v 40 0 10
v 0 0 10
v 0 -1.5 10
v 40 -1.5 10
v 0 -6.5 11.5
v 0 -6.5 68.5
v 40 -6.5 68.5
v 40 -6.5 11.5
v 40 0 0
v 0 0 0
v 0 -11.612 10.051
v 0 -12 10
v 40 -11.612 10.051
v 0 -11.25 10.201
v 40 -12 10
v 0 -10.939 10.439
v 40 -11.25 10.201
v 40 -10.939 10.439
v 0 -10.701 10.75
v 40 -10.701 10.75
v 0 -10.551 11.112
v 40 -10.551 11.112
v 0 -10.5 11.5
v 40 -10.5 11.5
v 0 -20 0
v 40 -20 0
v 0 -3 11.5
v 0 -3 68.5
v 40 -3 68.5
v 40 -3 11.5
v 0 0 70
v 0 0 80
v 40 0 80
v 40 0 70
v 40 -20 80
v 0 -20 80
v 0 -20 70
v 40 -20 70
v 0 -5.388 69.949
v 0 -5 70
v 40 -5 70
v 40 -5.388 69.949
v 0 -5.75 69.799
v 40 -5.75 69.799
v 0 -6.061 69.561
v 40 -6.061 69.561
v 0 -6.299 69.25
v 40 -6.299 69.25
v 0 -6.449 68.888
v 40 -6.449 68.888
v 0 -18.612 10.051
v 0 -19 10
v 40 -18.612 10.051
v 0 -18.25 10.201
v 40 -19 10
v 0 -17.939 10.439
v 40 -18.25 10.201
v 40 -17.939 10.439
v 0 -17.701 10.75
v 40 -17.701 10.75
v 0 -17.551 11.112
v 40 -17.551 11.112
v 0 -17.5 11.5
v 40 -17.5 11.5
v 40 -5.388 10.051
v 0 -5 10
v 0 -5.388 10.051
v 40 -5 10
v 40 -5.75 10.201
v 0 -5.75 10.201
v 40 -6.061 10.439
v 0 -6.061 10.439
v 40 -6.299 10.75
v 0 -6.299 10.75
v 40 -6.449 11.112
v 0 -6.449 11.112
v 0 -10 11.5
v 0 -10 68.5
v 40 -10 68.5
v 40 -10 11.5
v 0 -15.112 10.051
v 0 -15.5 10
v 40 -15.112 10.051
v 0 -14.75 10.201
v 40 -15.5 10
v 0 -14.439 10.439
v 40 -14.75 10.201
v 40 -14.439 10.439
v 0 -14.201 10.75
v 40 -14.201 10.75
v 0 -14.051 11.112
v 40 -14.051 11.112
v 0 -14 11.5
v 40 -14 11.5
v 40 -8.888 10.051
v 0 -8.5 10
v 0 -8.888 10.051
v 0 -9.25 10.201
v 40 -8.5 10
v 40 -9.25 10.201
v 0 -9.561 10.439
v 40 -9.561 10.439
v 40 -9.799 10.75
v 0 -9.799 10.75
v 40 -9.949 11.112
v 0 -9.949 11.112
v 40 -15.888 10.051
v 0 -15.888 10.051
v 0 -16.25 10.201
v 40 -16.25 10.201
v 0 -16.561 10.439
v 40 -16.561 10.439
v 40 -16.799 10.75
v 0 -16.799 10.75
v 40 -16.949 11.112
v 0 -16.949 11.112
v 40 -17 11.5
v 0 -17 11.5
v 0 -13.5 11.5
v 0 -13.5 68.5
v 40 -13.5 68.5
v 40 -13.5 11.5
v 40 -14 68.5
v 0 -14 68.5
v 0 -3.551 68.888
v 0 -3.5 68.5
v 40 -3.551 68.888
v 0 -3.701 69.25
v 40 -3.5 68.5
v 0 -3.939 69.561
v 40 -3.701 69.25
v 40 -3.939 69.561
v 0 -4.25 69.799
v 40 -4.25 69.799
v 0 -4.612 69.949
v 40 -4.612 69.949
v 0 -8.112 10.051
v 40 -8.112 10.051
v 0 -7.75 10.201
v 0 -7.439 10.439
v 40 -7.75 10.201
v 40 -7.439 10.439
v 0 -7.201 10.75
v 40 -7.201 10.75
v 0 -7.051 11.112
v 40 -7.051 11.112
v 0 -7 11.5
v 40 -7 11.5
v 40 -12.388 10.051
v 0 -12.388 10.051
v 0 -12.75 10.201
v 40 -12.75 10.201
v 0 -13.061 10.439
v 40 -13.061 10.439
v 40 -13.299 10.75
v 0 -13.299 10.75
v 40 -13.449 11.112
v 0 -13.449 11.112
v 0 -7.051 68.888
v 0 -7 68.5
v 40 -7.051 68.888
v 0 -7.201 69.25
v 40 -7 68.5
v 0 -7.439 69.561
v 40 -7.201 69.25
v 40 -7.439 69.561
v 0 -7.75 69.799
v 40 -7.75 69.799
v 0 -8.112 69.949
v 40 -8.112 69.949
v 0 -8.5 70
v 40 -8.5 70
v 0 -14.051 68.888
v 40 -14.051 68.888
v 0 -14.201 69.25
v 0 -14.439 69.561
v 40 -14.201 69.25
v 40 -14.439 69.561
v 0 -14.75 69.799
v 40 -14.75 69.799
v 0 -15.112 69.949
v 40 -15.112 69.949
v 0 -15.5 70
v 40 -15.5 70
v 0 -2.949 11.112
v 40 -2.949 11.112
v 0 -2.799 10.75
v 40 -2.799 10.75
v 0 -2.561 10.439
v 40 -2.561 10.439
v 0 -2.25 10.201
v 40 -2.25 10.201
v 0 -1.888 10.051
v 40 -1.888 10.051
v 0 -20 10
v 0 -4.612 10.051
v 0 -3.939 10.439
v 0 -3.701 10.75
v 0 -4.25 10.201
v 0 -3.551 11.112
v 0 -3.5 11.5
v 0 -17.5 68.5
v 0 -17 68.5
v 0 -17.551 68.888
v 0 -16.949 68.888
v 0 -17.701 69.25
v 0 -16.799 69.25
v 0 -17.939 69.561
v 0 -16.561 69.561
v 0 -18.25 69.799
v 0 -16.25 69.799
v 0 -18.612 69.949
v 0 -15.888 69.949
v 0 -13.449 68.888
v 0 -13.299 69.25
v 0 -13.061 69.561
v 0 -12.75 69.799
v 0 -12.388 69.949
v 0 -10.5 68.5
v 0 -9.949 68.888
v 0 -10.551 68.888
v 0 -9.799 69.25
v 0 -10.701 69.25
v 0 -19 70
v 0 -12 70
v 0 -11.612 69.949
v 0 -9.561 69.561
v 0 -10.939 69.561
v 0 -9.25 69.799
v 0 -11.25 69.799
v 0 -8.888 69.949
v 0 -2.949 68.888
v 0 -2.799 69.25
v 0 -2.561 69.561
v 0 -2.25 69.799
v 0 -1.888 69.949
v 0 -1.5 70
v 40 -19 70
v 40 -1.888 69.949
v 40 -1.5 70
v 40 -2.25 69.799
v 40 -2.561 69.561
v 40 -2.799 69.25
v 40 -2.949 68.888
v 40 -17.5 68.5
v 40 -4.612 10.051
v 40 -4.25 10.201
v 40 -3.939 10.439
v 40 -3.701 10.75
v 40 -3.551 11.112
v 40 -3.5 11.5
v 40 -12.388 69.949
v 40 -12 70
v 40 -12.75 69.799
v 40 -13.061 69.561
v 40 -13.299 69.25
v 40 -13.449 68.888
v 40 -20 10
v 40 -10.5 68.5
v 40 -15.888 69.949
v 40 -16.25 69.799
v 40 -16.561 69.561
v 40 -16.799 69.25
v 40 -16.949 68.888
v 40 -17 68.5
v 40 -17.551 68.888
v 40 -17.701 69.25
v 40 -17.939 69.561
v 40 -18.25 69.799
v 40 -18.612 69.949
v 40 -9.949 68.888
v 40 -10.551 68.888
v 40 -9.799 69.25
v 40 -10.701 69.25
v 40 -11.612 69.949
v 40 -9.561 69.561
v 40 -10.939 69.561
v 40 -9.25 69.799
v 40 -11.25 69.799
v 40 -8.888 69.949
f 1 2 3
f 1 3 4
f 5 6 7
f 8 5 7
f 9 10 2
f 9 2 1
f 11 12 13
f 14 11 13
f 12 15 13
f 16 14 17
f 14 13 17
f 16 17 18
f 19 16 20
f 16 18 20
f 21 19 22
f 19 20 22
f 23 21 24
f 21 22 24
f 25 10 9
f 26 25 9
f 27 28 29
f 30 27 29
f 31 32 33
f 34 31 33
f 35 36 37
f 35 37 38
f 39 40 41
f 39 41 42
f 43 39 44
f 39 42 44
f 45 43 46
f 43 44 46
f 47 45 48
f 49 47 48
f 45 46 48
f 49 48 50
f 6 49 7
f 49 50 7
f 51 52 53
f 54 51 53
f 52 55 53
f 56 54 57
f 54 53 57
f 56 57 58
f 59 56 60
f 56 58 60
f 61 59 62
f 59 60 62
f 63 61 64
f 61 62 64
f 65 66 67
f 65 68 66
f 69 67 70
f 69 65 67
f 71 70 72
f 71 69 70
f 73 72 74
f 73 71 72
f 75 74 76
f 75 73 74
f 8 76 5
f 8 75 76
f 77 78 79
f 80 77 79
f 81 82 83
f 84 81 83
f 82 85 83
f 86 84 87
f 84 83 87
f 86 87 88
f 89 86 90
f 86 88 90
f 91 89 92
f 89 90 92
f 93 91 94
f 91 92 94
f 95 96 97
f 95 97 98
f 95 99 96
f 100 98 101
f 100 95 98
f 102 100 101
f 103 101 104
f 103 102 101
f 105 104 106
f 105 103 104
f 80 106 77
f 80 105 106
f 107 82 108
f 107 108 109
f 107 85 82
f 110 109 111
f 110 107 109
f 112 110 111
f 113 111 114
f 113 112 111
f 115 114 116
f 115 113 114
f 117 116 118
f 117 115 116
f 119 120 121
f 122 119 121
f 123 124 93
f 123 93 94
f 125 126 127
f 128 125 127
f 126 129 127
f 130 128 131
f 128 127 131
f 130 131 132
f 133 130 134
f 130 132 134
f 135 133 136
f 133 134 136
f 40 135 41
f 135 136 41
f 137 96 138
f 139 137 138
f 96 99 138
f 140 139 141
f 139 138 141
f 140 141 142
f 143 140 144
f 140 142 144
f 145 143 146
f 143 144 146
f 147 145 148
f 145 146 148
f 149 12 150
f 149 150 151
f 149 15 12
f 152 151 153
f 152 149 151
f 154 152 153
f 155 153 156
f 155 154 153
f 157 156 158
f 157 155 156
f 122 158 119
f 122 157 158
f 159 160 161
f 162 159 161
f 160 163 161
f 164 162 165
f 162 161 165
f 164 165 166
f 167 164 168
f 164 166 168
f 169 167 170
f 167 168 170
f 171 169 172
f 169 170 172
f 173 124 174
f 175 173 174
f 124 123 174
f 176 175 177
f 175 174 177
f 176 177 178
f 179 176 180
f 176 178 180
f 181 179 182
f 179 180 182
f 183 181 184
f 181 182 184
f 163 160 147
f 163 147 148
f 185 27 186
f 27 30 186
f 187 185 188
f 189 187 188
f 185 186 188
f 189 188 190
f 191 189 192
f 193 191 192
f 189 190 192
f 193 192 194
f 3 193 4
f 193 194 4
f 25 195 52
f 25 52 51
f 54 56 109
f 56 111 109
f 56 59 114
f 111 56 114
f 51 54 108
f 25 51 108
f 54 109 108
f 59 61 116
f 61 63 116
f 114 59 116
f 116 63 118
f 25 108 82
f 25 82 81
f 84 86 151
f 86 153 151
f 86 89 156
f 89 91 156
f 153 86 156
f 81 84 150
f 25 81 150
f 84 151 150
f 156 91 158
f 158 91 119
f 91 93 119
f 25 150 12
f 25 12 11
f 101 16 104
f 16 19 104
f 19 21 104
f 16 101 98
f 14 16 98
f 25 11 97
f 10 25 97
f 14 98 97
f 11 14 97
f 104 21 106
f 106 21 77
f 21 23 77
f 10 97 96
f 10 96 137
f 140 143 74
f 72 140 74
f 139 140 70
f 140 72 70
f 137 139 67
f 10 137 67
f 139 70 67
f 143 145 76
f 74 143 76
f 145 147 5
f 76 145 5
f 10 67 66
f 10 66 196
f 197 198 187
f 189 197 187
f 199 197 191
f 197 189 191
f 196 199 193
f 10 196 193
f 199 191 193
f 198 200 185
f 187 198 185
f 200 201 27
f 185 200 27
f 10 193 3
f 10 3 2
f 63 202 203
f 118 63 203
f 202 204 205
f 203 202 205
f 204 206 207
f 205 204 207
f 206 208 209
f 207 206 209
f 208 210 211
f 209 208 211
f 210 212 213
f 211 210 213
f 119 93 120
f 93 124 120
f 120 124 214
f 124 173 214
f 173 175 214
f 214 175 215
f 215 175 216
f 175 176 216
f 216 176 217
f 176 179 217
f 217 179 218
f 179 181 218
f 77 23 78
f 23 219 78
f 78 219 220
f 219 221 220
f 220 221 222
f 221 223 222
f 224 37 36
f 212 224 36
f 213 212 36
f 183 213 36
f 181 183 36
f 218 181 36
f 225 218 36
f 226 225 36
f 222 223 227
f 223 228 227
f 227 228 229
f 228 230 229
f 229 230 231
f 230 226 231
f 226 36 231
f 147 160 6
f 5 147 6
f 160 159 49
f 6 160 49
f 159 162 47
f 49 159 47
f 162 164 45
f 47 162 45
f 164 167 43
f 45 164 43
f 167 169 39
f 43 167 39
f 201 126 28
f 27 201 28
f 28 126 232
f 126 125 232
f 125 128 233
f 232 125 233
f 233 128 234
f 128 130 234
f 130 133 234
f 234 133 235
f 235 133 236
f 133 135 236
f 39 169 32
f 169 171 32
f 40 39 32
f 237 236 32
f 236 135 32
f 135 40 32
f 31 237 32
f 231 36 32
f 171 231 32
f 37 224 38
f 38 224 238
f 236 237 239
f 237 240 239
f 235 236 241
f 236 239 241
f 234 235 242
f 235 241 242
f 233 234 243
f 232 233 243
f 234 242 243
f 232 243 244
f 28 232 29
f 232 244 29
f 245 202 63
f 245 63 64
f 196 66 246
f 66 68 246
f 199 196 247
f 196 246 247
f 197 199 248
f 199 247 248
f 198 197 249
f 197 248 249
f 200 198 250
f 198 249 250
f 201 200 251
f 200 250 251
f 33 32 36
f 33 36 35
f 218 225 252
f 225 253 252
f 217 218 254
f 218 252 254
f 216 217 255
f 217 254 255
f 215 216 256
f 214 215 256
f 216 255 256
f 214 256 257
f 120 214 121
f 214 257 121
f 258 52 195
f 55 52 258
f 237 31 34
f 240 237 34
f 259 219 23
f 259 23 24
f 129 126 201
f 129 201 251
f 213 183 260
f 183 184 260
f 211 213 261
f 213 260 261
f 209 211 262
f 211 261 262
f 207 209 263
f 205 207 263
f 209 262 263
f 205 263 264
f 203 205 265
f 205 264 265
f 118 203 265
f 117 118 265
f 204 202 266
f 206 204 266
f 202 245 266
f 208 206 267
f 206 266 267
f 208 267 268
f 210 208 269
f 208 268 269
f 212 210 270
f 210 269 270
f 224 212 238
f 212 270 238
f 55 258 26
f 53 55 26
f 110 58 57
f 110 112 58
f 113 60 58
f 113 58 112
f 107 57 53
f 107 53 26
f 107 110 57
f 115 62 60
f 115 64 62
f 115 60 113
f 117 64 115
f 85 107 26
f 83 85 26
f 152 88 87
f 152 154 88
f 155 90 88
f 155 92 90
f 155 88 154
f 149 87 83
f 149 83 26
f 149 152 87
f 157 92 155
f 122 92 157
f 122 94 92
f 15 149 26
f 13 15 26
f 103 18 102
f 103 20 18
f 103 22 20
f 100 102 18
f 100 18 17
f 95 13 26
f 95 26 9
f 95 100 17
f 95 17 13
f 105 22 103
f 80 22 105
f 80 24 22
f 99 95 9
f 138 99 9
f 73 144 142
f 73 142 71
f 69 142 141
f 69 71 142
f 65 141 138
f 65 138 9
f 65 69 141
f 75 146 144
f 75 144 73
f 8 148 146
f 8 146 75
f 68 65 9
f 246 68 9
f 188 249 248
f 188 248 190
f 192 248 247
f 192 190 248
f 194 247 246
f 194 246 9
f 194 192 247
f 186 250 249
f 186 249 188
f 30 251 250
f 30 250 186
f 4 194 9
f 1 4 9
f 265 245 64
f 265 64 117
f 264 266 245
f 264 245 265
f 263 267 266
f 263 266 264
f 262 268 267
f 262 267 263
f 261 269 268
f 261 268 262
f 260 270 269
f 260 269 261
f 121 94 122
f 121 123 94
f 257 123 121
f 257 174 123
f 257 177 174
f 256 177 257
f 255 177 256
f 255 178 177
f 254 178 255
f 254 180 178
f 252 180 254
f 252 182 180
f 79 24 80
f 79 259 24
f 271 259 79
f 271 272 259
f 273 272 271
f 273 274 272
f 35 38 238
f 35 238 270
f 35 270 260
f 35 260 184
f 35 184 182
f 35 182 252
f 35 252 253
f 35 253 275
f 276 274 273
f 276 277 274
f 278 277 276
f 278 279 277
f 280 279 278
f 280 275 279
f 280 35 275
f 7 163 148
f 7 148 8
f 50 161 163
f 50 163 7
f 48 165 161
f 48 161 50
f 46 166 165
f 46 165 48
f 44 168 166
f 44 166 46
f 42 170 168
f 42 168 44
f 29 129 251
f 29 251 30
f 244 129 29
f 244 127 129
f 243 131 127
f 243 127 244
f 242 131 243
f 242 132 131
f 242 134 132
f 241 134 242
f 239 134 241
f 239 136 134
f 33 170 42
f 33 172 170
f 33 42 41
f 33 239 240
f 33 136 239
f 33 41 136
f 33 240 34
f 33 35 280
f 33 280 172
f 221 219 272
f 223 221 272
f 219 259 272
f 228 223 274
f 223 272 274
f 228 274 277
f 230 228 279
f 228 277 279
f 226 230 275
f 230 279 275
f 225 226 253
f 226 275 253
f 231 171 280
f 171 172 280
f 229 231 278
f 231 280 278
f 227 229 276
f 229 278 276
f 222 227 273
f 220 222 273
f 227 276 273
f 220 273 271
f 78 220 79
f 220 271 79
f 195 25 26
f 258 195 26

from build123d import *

# Parameters (mm, degrees)
F0_W     = 40
F0_H     = 20
F1_DEPTH = 10
F3_W     = 40
F3_H     = 0.5
F4_DEPTH = 30
F6_R     = 1.49999


# Not quite as in the source:
# - a fillet or chamfer is up to 0.001 mm smaller than in the source, because OpenCascade refuses the exact size


with BuildPart() as f1:
    # F0 (on Top) → F1 (new body)
    with BuildSketch(Plane.XY):
        with Locations((20, -10)):
            Rectangle(F0_W, F0_H)
    extrude(amount=F1_DEPTH)

    # F3 (on face) → F4 (join)
    with BuildSketch(Plane.XY.offset(10)):
        with Locations((20, -3.25)):
            Rectangle(F3_W, F3_H)
        with Locations((20, -6.75)):
            Rectangle(F3_W, F3_H)
        with Locations((20, -10.25)):
            Rectangle(F3_W, F3_H)
        with Locations((20, -13.75)):
            Rectangle(F3_W, F3_H)
        with Locations((20, -17.25)):
            Rectangle(F3_W, F3_H)
    extrude(amount=F4_DEPTH)

    # F5: F1 across face


with BuildPart() as f1_1:
    add(f1.part)
    add(f1.part.mirror(Plane(origin=(20, -17.25, 40), x_dir=(1, 0, 0), z_dir=(0, 0, 1))))

    # F6 (radius 1.5 in the source; OpenCascade refuses exactly that, so slightly less here)
    f6_edges = [f1_1.edges().sort_by_distance(p)[0] for p in [
        (20, -17, 70),
        (20, -13.5, 70),
        (20, -10, 70),
        (20, -6.5, 70),
        (20, -3, 70),
        (20, -3.5, 70),
        (20, -7, 70),
        (20, -10.5, 70),
        (20, -14, 70),
        (20, -17.5, 70),
        (20, -17.5, 10),
        (20, -14, 10),
        (20, -10.5, 10),
        (20, -7, 10),
        (20, -3.5, 10),
        (20, -17, 10),
        (20, -13.5, 10),
        (20, -10, 10),
        (20, -6.5, 10),
        (20, -3, 10),
    ]]
    fillet(f6_edges, radius=F6_R)


solid = f1_1.part
